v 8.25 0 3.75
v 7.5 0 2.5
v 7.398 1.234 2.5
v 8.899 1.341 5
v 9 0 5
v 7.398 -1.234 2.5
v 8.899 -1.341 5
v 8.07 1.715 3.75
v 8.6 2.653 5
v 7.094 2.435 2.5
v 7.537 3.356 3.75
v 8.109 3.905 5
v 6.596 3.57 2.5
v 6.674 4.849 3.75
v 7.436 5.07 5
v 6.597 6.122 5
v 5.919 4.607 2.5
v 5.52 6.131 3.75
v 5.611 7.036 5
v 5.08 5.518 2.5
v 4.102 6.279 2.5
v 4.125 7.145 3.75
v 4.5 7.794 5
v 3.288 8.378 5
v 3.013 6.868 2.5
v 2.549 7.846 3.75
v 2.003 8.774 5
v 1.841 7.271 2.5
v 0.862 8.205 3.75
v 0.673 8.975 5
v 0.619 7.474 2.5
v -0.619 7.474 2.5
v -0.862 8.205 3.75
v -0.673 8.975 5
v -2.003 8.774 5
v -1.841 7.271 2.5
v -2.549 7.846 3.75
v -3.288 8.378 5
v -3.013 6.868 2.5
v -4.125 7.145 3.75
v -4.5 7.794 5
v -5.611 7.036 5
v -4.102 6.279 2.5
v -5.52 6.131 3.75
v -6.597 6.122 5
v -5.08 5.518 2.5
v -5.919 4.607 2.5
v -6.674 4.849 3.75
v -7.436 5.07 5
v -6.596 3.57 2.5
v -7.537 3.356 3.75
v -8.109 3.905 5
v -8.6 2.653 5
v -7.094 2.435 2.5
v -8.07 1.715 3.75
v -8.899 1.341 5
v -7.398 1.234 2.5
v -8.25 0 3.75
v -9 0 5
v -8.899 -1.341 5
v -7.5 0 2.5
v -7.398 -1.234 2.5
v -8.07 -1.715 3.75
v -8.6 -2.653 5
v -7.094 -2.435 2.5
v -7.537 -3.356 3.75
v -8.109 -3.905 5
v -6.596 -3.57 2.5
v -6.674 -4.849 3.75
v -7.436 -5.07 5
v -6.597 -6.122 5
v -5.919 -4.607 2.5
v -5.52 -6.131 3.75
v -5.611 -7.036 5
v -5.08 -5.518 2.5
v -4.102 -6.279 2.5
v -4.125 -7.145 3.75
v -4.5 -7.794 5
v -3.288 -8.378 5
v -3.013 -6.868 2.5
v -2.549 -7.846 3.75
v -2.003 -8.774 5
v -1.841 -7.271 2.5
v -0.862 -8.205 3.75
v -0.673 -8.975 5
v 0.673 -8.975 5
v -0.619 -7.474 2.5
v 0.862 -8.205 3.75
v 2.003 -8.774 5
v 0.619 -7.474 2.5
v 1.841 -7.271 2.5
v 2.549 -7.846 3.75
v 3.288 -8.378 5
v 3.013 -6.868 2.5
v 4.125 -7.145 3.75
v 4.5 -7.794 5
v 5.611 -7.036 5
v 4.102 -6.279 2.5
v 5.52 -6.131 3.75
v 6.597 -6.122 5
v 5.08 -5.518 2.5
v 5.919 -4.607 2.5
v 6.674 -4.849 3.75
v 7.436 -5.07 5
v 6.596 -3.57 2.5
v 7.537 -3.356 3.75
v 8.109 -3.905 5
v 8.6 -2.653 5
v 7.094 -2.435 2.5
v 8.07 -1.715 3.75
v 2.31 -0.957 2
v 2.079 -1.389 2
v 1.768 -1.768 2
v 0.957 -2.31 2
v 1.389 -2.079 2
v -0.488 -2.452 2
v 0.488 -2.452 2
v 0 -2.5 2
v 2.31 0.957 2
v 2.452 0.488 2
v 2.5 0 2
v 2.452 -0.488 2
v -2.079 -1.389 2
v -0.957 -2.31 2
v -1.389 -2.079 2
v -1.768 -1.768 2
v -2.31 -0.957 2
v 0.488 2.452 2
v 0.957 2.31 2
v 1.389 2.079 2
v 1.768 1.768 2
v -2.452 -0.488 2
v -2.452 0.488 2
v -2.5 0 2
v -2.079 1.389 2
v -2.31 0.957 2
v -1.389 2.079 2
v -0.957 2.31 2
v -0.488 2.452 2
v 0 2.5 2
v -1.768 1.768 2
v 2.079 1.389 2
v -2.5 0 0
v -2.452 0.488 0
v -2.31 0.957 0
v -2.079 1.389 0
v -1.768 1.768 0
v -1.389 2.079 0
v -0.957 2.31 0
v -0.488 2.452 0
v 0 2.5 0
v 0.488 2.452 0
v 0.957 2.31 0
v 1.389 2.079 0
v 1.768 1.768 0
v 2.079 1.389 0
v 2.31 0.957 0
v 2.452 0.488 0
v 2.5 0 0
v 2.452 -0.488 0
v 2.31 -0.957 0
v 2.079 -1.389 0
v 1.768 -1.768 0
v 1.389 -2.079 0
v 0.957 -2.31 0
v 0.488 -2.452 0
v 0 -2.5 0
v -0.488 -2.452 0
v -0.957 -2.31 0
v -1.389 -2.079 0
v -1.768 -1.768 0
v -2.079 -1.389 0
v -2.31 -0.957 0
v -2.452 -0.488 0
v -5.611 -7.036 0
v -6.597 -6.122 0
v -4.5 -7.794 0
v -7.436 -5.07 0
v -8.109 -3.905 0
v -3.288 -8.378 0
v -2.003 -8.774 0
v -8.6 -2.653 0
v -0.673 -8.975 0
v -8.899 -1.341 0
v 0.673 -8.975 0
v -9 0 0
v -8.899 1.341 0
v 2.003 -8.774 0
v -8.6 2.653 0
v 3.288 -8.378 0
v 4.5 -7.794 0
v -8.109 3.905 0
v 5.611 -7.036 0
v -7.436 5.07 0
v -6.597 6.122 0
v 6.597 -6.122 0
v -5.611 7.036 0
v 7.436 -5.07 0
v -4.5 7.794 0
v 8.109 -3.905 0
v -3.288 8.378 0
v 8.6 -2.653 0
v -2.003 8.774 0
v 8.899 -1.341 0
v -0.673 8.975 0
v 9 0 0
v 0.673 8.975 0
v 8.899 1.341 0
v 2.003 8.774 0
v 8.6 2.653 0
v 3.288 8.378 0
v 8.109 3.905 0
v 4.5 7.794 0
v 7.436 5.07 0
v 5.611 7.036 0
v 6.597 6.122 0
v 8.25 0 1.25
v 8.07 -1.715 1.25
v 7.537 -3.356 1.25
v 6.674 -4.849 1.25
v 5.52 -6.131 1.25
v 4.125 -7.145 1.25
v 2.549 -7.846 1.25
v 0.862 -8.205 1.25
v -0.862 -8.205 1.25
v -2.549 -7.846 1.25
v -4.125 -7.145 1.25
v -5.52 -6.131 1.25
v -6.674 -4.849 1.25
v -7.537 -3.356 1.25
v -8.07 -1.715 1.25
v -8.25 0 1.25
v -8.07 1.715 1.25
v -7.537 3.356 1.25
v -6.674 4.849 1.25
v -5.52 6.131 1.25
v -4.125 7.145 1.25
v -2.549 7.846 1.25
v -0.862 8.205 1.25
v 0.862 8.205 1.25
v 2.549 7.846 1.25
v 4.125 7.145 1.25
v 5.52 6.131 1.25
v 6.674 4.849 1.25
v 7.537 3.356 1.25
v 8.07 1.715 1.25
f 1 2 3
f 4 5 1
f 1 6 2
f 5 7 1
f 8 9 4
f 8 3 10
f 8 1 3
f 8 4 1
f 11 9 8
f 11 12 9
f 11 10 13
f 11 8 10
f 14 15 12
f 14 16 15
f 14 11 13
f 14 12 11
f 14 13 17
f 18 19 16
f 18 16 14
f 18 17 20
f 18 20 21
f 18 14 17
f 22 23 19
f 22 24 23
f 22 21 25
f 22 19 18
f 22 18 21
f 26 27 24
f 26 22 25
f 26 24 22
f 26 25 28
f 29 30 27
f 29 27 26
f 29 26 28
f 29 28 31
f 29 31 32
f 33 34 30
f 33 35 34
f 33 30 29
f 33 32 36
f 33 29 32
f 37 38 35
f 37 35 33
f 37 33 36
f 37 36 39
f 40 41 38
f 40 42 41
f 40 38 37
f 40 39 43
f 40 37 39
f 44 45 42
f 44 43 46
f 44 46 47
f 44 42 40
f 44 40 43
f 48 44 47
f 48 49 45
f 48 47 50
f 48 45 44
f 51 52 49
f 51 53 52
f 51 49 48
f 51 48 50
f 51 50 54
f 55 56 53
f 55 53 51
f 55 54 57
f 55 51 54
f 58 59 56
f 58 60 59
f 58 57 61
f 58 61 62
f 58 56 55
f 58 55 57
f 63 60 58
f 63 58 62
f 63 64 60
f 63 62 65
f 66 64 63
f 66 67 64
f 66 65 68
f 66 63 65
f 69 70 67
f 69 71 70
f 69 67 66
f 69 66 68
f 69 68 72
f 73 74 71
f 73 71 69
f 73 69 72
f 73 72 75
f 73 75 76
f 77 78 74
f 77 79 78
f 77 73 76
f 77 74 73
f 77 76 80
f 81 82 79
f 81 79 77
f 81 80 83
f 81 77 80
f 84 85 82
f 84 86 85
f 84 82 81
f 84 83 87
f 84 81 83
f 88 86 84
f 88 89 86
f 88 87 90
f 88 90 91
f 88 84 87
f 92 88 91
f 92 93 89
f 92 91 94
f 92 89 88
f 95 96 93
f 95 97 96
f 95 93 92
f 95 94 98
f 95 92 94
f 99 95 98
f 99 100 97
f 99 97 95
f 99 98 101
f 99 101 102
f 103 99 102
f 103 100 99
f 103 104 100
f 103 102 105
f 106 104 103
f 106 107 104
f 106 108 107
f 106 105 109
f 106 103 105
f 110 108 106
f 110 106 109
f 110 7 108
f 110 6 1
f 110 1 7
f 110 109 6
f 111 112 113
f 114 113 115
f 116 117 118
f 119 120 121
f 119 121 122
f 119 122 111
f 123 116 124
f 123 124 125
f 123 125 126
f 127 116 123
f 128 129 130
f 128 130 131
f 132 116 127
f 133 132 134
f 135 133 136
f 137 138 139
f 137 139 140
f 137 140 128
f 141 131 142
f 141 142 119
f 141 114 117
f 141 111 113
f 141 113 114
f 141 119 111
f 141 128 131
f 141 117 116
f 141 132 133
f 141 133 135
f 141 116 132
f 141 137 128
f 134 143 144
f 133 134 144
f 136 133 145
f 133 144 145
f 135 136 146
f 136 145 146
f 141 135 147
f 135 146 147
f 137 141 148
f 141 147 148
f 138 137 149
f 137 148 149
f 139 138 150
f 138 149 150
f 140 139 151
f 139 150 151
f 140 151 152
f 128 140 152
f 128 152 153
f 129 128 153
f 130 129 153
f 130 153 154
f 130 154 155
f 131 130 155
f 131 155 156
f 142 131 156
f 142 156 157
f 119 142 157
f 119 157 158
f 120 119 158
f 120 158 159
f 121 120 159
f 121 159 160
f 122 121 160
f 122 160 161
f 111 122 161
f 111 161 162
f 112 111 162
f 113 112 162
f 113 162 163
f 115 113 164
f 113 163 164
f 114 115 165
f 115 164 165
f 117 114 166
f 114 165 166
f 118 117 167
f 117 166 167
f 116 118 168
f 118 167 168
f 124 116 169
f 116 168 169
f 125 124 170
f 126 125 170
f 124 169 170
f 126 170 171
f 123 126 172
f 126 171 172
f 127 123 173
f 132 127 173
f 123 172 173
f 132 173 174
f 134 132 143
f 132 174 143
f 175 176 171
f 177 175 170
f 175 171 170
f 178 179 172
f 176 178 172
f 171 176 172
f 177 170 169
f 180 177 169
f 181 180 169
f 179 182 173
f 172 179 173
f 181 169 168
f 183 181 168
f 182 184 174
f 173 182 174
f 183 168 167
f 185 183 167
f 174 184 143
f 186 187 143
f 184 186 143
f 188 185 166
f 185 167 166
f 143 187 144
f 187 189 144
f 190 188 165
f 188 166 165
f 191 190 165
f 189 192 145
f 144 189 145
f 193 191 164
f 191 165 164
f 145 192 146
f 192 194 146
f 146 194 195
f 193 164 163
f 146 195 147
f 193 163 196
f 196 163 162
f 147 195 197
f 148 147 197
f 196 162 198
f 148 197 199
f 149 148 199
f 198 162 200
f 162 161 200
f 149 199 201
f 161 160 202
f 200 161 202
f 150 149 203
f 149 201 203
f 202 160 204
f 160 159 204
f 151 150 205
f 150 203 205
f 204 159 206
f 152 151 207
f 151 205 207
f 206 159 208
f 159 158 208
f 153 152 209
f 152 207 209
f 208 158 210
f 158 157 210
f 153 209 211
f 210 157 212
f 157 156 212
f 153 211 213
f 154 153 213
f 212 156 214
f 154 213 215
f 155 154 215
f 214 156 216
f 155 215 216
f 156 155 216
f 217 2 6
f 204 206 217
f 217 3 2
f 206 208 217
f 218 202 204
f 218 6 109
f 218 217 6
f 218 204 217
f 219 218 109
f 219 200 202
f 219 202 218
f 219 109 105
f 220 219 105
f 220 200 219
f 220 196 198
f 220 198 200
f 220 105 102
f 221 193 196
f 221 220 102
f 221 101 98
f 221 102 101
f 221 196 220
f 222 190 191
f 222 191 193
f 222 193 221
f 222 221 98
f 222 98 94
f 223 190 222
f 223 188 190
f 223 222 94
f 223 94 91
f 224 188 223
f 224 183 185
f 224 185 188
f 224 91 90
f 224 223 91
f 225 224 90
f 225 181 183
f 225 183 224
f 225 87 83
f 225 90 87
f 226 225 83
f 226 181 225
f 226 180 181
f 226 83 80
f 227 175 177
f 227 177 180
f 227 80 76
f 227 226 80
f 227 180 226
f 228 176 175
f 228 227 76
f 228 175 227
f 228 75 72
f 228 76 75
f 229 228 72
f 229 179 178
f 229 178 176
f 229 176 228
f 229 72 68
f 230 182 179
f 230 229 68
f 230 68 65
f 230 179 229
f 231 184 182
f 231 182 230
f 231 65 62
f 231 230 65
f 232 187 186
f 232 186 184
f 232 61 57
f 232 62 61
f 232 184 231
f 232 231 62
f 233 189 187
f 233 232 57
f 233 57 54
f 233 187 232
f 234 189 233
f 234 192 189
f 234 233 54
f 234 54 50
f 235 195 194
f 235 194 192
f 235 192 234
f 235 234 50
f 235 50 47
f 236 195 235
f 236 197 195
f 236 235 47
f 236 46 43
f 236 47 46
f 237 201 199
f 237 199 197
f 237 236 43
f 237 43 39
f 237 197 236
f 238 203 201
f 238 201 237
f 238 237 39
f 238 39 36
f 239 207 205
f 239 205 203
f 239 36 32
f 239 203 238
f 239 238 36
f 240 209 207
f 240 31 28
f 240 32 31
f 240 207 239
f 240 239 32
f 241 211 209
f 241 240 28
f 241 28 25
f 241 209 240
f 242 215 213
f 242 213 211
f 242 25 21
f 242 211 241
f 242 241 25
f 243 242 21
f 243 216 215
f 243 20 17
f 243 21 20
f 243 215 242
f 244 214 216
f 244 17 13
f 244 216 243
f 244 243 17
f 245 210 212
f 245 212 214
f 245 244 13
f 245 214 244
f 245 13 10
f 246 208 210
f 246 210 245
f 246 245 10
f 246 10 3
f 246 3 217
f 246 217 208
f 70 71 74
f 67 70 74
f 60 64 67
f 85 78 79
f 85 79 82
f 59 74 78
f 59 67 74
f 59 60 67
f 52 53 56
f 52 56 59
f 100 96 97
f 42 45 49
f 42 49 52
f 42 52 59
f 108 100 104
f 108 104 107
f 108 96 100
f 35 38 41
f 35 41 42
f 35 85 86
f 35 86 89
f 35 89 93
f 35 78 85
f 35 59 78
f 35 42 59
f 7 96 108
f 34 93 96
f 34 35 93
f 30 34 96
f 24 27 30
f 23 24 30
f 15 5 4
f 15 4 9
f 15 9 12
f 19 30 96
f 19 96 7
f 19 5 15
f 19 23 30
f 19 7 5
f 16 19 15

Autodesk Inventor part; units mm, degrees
ref_plane "YZ Plane" through (0, 0, 0) normal (1, 0, 0) x (0, 1, 0)
sketch "스케치1" plane through (0, 0, 0) normal (0, 0, 1) x (1, 0, 0)
  circle A0 centre (0, 0) radius 9
  dimension "d0" = 18
ref_plane "작업 평면2" through (0, 0, 2.5) normal (0, 0, 1) x (1, 0, 0)
sketch "스케치2" plane through (0, 0, 2.5) normal (0, 0, 1) x (1, 0, 0)
  circle A0 centre (0, 0) radius 7.5
  dimension "d3" = 15
ref_plane "작업 평면1" through (0, 0, 5) normal (0, 0, 1) x (1, 0, 0)
sketch "스케치3" plane through (0, 0, 5) normal (0, 0, 1) x (1, 0, 0)
  circle A0 centre (0, 0) radius 9
loft "로프트1" add profiles "스케치3", "스케치2"
loft "로프트2" add profiles "스케치1" section 2 edges at (-7.5, 0, 2.5)
sketch "스케치4" plane through (0, 0, 0) normal (0, 0, -1) x (-1, 0, 0)
  circle A0 centre (0, 0) radius 2.5
  dimension "d13" = 5
extrude "돌출2" cut sketch "스케치4" against normal blind 2
properties part number "wheel"
